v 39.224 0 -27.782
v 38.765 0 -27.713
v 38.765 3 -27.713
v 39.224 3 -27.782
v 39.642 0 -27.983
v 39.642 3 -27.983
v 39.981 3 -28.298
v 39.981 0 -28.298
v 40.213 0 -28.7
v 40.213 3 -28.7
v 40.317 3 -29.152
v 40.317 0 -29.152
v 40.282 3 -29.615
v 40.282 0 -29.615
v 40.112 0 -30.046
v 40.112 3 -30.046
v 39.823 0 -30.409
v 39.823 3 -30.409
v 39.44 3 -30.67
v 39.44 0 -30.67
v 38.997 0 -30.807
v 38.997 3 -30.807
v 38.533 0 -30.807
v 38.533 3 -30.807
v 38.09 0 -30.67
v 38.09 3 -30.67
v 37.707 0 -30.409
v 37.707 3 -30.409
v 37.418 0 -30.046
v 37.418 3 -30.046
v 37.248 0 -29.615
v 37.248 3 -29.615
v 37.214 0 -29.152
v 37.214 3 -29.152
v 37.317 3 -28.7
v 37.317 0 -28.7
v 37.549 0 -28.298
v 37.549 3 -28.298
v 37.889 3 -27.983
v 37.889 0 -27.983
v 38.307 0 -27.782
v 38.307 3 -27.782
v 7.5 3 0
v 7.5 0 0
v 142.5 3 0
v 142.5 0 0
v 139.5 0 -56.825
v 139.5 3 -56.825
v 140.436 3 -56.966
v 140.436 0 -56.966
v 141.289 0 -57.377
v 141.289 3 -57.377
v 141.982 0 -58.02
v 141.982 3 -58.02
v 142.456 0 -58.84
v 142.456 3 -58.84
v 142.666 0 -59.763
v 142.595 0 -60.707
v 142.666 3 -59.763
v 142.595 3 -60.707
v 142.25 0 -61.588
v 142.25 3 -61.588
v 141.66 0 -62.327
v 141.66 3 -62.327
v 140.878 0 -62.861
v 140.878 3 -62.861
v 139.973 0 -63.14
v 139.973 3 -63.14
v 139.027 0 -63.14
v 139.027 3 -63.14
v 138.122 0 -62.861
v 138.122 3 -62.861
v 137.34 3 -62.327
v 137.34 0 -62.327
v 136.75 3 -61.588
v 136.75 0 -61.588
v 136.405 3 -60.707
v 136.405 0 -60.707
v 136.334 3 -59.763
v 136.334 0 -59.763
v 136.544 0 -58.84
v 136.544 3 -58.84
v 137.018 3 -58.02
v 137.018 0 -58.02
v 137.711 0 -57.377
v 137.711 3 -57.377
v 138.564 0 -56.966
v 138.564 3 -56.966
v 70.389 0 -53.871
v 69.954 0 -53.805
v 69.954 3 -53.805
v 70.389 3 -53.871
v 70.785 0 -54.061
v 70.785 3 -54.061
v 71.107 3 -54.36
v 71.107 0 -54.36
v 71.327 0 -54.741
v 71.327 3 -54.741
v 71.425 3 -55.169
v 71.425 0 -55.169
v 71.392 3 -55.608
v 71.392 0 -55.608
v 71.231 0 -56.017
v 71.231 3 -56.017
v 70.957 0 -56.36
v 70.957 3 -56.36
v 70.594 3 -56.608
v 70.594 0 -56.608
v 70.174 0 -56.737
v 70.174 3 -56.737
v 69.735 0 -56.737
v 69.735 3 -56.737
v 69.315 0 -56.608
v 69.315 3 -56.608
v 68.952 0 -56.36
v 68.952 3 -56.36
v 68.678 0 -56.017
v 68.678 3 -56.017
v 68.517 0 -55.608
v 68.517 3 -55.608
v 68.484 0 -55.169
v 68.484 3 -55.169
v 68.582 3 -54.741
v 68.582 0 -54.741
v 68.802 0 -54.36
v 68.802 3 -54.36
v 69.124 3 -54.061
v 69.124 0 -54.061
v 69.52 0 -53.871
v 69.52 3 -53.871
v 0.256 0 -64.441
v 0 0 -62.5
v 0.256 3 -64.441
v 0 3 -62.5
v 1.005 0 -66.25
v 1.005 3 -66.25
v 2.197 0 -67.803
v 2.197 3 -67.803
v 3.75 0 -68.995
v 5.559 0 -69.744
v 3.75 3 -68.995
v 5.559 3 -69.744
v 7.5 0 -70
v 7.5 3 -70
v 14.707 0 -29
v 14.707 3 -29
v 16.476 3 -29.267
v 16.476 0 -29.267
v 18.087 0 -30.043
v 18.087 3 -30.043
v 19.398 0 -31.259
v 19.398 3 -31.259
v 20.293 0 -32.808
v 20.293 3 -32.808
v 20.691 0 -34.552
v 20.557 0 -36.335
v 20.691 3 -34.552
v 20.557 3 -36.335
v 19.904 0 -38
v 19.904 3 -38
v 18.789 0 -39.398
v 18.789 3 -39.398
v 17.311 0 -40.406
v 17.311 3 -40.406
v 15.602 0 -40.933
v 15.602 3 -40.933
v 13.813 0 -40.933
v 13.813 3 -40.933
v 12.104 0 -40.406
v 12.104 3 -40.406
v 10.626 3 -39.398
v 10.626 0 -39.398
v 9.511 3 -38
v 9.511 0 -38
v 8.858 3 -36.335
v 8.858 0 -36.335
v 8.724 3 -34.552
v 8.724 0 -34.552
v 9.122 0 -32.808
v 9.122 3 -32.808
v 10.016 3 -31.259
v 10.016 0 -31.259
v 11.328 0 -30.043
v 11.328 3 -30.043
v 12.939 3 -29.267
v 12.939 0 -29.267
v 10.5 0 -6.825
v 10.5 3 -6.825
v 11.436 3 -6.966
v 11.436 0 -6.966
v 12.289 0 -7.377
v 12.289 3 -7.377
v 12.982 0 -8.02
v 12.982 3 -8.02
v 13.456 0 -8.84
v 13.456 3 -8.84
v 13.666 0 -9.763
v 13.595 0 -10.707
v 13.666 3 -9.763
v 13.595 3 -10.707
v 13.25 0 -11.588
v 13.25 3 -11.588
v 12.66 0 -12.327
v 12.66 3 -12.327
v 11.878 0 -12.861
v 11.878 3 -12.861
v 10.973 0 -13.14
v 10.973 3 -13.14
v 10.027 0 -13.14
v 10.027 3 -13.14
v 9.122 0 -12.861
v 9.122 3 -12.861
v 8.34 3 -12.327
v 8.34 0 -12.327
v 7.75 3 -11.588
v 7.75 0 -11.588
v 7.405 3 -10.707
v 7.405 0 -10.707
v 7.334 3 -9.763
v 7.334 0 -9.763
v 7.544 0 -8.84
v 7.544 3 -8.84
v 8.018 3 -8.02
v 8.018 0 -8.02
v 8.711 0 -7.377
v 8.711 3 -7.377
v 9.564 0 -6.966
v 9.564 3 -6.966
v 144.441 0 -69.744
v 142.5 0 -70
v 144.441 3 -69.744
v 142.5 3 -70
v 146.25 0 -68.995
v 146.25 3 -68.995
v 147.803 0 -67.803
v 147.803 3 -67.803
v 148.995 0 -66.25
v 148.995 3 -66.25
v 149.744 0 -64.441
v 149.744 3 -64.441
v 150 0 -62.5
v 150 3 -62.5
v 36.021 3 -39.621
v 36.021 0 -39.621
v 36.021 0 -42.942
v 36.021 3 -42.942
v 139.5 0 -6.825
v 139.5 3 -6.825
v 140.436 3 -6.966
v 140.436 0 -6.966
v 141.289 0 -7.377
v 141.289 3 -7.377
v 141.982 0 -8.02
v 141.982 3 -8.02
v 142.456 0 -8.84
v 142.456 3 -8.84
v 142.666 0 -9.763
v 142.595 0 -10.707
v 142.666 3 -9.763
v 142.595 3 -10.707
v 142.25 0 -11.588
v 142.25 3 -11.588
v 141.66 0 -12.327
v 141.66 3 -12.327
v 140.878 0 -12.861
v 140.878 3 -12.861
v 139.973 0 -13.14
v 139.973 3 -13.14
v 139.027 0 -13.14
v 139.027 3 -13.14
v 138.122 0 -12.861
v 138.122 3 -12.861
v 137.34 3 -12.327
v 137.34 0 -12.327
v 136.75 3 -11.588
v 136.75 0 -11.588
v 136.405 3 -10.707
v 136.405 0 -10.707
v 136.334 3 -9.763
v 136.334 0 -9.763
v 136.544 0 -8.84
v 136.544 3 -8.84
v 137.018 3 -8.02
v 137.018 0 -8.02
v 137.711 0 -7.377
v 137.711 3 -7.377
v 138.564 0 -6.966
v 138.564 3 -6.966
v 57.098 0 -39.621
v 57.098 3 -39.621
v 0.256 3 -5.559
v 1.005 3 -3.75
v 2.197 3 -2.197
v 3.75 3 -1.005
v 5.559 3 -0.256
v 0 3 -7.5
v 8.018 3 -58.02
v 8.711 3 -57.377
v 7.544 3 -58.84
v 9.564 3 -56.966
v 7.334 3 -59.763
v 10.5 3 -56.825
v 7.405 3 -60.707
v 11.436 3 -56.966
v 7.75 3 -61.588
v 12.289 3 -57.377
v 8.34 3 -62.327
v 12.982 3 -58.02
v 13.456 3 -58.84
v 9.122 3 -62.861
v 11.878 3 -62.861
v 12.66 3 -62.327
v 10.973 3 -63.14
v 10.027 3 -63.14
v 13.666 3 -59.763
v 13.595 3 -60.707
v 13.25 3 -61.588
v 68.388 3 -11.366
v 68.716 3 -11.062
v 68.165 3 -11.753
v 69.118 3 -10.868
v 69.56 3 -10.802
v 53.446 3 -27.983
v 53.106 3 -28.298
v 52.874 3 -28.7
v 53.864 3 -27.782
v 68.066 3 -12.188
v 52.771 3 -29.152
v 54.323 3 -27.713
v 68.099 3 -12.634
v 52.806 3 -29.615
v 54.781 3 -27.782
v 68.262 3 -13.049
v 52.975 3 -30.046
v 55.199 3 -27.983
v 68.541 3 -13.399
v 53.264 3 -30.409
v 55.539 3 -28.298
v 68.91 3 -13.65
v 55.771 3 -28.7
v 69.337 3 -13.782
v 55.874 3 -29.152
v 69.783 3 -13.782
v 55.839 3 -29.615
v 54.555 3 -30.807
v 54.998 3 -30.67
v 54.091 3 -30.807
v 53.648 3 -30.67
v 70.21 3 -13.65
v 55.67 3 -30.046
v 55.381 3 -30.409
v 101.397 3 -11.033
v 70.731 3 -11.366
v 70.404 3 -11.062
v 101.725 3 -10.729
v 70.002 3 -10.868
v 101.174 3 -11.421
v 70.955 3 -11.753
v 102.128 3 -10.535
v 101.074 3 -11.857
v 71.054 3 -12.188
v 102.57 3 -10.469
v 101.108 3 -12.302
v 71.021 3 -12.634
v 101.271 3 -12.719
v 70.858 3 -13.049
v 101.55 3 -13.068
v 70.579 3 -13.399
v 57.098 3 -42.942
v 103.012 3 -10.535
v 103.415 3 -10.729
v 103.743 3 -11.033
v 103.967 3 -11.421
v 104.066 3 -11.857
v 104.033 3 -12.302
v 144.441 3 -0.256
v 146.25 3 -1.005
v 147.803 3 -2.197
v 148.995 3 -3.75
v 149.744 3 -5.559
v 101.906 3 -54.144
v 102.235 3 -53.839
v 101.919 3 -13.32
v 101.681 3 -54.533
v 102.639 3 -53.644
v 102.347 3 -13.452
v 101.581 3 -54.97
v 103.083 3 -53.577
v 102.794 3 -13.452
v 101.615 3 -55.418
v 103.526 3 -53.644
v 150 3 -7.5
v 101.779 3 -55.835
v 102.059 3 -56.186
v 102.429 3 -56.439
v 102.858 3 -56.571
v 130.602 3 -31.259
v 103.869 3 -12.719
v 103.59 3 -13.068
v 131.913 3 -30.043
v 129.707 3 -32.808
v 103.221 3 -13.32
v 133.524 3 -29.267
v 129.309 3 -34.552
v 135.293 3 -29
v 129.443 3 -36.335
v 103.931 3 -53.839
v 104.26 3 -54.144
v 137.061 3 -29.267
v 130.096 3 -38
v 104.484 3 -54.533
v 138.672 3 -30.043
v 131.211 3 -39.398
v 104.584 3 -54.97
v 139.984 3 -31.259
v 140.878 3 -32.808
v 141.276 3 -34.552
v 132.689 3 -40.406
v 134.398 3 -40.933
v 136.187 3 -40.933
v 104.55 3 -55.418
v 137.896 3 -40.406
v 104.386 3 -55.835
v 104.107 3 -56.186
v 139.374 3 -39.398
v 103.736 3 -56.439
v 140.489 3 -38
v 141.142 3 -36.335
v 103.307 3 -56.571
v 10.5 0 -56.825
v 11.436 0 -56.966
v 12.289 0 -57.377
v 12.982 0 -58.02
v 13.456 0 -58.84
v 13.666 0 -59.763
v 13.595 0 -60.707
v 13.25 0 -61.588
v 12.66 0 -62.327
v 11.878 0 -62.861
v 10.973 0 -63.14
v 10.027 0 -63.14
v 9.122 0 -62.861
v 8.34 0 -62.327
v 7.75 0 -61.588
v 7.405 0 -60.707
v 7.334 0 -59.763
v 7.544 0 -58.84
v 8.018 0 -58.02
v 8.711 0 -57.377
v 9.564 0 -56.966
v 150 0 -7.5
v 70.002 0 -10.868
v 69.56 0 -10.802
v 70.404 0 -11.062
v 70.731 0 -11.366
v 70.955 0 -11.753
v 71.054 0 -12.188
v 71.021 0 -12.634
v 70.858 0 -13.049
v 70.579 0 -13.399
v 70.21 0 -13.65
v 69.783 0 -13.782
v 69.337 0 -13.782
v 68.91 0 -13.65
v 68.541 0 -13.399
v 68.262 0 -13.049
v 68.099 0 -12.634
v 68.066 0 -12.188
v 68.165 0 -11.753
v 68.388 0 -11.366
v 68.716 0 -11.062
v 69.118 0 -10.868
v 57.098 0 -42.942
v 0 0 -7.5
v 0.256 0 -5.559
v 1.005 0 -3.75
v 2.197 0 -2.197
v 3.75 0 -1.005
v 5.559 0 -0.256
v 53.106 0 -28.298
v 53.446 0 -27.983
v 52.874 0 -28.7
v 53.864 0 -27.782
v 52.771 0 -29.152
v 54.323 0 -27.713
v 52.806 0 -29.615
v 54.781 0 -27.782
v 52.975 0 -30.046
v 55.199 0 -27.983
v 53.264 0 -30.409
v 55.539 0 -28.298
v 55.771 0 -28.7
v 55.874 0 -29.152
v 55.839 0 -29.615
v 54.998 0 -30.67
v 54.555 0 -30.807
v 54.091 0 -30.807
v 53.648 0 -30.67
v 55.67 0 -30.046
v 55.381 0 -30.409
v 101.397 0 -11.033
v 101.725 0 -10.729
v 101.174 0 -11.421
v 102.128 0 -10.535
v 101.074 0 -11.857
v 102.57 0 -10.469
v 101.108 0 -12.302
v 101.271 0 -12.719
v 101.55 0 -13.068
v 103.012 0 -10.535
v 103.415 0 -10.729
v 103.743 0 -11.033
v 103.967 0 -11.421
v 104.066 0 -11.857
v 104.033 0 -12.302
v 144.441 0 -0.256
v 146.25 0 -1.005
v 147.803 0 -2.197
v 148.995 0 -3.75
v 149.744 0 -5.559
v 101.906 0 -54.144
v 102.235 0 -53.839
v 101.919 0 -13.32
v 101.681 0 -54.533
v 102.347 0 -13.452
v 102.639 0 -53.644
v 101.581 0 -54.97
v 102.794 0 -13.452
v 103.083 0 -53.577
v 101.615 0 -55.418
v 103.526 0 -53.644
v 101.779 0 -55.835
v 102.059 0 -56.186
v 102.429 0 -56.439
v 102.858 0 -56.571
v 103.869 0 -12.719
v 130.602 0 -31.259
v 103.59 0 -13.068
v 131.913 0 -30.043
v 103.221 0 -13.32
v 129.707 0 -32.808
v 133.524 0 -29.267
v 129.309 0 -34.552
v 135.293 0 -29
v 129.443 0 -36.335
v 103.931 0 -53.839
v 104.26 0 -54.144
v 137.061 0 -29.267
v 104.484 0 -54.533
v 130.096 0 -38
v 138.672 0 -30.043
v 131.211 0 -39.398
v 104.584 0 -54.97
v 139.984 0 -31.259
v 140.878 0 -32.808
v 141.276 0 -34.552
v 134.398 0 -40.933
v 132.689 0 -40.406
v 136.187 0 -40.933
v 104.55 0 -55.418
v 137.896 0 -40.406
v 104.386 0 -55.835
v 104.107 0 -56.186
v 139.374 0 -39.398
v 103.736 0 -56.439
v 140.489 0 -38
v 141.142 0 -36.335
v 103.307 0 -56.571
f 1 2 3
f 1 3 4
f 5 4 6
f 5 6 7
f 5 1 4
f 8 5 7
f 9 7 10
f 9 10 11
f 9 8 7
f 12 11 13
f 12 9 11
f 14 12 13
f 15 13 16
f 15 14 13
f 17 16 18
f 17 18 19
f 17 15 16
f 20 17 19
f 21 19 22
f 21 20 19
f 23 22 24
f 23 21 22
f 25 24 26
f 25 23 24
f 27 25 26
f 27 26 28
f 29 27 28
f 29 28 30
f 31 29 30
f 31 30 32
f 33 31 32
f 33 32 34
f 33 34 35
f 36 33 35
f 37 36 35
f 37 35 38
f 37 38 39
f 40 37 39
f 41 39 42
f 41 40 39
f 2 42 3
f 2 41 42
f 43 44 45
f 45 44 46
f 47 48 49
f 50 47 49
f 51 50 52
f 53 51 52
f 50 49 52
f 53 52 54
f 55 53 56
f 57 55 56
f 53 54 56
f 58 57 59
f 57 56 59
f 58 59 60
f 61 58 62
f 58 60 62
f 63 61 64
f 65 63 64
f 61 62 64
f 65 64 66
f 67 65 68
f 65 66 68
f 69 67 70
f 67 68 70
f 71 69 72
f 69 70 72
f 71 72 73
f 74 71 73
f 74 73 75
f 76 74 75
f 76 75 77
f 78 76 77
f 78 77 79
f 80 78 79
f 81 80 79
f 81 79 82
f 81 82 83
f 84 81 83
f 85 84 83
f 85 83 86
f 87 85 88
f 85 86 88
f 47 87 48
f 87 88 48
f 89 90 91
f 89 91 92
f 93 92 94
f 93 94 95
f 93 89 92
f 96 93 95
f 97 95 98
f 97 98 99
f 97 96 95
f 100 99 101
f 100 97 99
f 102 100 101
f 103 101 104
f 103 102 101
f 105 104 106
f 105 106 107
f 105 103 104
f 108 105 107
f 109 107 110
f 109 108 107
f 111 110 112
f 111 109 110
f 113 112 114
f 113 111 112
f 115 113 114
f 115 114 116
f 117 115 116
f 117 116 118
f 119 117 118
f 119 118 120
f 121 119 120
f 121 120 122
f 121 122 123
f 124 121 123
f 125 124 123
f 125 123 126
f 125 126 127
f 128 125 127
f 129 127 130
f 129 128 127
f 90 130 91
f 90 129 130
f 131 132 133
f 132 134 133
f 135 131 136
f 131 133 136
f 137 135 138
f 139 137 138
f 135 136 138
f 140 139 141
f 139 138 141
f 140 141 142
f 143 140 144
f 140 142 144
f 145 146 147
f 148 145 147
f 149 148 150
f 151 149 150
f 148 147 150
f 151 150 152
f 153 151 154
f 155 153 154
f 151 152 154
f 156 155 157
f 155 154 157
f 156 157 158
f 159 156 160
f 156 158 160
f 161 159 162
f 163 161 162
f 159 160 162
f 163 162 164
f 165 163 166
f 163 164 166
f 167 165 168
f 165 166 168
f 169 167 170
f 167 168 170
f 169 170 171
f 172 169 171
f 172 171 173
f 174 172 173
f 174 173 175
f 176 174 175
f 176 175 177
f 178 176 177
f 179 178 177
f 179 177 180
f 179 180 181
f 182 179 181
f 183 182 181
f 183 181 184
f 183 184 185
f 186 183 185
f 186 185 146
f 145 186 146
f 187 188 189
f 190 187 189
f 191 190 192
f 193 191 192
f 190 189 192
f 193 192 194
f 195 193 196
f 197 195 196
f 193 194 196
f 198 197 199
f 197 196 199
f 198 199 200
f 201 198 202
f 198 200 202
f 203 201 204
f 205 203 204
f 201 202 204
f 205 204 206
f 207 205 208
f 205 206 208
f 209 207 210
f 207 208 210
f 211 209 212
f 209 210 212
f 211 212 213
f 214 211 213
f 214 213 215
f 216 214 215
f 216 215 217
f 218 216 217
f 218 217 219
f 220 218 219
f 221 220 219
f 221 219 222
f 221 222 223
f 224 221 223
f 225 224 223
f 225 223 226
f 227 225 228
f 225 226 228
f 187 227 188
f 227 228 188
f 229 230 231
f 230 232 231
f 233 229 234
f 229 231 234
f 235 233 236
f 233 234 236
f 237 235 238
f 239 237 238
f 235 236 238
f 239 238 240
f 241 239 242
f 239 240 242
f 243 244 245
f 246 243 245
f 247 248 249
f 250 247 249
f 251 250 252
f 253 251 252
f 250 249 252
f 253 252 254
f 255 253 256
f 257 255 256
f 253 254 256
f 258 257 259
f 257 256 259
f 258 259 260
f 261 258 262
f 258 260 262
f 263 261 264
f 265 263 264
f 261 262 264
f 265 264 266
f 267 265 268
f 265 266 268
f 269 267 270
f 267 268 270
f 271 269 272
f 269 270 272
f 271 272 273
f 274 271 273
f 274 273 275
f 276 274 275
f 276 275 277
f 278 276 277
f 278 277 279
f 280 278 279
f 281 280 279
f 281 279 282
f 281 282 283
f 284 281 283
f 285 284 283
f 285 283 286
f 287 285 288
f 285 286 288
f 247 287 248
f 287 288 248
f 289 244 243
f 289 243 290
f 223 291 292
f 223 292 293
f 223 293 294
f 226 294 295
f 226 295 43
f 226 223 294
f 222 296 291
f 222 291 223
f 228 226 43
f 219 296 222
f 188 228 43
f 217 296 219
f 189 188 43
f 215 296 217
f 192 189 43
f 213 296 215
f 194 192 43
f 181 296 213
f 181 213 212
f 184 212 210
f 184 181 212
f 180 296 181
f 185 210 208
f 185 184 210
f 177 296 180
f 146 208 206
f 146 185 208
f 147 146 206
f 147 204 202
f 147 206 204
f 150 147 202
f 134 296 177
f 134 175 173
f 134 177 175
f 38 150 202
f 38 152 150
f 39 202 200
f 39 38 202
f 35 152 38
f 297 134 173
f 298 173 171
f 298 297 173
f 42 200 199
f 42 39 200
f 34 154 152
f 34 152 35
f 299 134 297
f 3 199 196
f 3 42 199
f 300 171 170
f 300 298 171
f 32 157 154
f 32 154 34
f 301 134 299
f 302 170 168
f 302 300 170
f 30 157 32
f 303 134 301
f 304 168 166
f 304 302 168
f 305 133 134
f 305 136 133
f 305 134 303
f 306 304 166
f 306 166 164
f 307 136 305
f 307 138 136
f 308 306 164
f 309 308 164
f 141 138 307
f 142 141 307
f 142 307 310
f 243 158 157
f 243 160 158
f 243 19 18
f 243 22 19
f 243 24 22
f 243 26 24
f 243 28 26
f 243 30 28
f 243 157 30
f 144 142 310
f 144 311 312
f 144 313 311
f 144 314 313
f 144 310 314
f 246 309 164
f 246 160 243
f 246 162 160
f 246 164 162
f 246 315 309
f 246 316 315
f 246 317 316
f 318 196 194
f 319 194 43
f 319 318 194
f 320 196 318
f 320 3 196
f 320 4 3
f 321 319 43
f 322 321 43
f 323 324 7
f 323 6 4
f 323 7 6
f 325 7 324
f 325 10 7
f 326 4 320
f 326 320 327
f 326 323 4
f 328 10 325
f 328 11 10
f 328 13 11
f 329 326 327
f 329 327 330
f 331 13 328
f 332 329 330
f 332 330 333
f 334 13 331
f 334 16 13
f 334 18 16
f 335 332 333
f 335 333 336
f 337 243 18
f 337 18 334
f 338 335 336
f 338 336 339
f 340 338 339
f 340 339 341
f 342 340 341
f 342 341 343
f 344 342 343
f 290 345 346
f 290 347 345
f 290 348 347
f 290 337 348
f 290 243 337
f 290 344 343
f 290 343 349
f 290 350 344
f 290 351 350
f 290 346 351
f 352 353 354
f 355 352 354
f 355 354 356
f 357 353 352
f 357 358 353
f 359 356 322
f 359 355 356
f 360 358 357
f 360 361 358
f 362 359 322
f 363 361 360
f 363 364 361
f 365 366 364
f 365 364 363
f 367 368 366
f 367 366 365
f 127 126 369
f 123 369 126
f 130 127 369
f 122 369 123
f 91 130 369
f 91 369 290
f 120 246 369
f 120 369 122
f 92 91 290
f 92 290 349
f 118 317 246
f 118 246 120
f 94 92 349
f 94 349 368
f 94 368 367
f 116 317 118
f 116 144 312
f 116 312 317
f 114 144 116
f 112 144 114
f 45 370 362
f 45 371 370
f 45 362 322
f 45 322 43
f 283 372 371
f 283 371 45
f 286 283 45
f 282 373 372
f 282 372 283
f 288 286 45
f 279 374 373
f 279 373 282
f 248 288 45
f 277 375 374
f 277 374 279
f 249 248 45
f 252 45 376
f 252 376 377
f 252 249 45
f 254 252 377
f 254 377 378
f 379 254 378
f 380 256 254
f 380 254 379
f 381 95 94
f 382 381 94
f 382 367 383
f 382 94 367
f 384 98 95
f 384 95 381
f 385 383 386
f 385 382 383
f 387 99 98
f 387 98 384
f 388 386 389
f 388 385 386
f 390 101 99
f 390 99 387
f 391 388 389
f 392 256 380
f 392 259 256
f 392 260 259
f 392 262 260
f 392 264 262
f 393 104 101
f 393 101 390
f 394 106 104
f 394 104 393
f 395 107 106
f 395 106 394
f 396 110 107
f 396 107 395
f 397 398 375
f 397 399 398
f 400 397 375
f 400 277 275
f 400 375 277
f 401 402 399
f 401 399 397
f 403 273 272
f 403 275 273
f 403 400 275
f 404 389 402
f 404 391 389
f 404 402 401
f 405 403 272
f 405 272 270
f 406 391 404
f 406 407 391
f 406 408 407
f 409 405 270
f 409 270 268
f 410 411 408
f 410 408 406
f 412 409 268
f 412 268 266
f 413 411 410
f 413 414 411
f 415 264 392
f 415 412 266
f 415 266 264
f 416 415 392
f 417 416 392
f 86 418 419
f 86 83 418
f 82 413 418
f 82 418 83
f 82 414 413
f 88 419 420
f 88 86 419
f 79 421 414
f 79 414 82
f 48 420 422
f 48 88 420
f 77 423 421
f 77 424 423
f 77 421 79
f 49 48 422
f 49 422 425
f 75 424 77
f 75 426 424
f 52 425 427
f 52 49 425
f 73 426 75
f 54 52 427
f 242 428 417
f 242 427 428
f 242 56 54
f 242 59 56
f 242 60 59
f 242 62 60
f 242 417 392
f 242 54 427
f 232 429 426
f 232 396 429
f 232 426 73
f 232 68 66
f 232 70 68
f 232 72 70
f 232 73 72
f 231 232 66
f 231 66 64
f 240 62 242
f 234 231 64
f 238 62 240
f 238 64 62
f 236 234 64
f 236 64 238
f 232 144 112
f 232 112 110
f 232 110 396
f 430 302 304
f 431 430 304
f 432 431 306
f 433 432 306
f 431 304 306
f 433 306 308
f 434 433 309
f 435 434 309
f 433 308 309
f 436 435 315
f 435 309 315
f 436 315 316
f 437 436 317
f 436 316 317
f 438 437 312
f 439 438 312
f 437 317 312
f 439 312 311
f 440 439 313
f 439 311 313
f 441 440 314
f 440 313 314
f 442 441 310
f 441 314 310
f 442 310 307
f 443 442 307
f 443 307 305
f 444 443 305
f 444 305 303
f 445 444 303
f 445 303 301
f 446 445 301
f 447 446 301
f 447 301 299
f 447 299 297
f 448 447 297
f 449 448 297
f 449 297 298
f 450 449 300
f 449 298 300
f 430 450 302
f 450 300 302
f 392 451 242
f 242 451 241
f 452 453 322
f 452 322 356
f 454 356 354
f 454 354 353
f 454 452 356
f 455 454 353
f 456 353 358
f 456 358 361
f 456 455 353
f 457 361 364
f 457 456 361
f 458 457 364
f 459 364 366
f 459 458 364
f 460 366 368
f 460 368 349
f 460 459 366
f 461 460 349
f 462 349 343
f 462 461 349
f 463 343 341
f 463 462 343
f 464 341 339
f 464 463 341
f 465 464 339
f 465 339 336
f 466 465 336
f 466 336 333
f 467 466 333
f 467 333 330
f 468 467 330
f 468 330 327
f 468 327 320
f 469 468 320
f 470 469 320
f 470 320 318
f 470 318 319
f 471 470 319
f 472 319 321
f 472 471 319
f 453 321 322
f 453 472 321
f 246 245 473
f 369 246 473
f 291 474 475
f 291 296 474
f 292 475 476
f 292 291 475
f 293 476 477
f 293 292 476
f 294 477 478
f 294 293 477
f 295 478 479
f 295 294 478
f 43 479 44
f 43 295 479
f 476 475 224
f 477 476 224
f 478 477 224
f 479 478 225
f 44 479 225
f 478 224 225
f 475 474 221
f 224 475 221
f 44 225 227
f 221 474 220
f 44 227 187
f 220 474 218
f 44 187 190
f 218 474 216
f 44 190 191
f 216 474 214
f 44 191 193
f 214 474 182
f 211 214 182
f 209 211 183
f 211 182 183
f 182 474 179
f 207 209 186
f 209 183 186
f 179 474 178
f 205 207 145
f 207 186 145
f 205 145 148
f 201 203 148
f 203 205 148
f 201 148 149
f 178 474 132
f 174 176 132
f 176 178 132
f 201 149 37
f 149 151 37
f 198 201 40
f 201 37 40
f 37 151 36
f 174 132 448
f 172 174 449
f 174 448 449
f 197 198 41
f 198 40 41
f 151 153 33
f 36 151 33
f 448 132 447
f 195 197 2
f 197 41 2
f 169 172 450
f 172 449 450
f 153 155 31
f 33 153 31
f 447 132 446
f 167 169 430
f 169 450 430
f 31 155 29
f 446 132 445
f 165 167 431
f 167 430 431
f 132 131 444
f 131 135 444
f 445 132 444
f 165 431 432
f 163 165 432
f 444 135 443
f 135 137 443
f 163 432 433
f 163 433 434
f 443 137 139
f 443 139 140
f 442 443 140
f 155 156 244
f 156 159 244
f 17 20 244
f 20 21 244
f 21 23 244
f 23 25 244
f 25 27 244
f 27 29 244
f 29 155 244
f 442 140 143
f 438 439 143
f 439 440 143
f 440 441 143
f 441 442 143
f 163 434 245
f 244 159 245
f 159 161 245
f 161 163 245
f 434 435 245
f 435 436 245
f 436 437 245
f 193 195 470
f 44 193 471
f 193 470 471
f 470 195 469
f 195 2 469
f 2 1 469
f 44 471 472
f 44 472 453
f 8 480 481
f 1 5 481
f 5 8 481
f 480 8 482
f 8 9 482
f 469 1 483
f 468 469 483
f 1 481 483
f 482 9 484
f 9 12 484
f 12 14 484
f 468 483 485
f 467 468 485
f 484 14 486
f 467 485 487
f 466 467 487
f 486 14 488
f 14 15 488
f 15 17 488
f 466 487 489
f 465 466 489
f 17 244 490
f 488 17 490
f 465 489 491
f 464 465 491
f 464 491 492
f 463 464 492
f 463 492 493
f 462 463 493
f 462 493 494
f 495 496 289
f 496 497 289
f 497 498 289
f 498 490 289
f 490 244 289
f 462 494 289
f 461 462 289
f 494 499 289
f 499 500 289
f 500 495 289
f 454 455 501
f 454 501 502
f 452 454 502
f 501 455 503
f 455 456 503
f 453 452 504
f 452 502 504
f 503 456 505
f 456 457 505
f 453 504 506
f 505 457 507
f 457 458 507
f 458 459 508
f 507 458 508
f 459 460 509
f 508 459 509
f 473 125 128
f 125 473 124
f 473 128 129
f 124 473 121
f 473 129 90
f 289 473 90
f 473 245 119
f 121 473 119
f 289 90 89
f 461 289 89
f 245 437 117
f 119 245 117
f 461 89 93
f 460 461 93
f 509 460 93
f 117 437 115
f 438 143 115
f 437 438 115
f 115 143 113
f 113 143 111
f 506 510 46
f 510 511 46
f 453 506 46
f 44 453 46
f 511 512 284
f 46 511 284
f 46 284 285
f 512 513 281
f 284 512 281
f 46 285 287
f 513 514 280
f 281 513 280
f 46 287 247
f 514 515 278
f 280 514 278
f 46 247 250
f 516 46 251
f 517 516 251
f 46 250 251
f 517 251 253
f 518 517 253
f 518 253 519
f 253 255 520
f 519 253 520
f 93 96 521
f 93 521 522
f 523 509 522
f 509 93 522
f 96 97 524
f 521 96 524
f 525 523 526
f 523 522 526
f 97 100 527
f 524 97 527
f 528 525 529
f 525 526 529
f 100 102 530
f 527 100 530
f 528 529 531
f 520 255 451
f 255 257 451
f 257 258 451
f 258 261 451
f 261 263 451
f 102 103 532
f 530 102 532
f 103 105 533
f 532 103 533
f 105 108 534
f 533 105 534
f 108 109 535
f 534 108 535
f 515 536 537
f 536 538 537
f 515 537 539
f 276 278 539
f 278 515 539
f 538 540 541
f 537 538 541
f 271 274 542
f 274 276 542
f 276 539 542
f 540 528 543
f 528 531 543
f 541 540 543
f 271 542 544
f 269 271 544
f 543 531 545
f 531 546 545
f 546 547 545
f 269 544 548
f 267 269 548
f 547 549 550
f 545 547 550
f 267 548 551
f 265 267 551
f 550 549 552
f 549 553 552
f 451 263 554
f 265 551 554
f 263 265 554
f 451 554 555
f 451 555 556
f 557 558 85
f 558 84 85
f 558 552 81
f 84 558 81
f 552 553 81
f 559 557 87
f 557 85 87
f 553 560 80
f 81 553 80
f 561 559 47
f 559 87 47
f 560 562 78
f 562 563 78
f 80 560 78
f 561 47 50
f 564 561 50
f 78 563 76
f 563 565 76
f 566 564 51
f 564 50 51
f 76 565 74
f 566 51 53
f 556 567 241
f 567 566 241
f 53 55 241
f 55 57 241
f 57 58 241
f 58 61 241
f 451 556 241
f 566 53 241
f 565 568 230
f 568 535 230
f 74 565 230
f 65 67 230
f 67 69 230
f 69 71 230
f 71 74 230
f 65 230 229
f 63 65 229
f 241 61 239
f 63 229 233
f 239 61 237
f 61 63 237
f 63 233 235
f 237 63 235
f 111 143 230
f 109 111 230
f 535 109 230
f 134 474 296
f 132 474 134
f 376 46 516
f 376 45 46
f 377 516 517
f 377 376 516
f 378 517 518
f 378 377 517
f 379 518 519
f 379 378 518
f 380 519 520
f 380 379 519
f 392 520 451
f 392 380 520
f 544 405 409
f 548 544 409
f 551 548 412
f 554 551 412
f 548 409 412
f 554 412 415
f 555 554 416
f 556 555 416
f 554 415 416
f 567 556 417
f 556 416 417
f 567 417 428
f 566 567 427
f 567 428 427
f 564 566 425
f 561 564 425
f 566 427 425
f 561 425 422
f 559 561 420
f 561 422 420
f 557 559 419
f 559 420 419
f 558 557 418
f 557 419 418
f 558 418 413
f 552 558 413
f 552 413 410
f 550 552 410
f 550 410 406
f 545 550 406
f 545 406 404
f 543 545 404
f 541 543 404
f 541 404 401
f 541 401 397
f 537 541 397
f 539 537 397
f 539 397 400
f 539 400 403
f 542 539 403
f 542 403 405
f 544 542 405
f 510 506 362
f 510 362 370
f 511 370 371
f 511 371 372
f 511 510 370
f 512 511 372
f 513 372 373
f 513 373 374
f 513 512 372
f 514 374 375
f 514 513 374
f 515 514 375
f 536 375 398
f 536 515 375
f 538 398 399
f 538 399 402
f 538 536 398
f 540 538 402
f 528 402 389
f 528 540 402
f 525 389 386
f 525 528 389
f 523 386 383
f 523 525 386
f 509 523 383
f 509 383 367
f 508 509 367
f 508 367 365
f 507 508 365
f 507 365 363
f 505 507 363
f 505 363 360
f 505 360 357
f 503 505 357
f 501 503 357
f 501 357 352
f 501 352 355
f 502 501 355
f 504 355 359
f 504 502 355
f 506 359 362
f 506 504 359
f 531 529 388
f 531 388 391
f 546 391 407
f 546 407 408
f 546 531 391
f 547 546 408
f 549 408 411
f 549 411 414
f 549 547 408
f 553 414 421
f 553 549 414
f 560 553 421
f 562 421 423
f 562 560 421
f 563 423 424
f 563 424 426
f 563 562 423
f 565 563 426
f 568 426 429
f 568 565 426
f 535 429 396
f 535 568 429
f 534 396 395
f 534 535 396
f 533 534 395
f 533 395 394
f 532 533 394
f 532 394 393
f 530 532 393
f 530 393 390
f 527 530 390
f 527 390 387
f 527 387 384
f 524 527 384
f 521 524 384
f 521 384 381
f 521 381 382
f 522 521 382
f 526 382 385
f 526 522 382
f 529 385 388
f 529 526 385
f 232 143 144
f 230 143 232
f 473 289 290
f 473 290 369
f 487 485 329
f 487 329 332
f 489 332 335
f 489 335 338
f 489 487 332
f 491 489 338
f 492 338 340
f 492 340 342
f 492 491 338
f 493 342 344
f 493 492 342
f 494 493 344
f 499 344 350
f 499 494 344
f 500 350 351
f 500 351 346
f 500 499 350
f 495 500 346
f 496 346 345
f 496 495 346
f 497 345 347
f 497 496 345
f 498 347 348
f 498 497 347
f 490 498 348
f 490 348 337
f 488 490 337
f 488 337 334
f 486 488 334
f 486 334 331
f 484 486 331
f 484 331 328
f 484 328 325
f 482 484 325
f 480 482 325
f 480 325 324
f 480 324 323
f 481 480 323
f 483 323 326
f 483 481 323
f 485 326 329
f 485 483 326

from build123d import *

# Parameters (mm, degrees)
ESBO_O2_W                = 150
ESBO_O2_H                = 70
ESBO_O2_R                = 1.505424276
ESBO_O2_R_2              = 1.49848088
ESBO_O2_R_3              = 1.474413832
ESBO_O2_R_4              = 1.5
ESBO_O2_R_5              = 1.55575
ESBO_O2_W_2              = 21.076348962
ESBO_O2_H_2              = 3.321026243
RESSALTO_EXTRUS_O1_DEPTH = 3
ESBO_O4_R                = 3.175
CORTE_EXTRUS_O1_DEPTH    = 3
FILETE1_R                = 7.5
ESBO_O8_R                = 6
CORTE_EXTRUS_O3_DEPTH    = 10


with BuildPart() as part:
    # Esboço2 → Ressalto-extrusão1 (new body)
    with BuildSketch(Plane(origin=(0, 0, 0), x_dir=(1, 0, 0), z_dir=(0, 1, 0))):
        with Locations((75, 35)):
            Rectangle(ESBO_O2_W, ESBO_O2_H)
        with Locations(Location((103.082572265, 55.082550604, 0), (0, 0, 270))):
            Circle(ESBO_O2_R, mode=Mode.SUBTRACT)
        with Locations(Location((69.55992433, 12.300225249, 0), (0, 0, 270))):
            Circle(ESBO_O2_R_2, mode=Mode.SUBTRACT)
        with Locations(Location((69.954401909, 55.279412058, 0), (0, 0, 270))):
            Circle(ESBO_O2_R_3, mode=Mode.SUBTRACT)
        with Locations(Location((102.570189974, 11.968678193, 0), (0, 0, 270))):
            Circle(ESBO_O2_R_4, mode=Mode.SUBTRACT)
        with Locations(Location((38.765135158, 29.268361159, 0), (0, 0, 270))):
            Circle(ESBO_O2_R_5, mode=Mode.SUBTRACT)
        with Locations(Location((54.322635158, 29.268361159, 0), (0, 0, 270))):
            Circle(ESBO_O2_R_5, mode=Mode.SUBTRACT)
        with Locations((46.559410677, 41.281799613)):
            Rectangle(ESBO_O2_W_2, ESBO_O2_H_2, mode=Mode.SUBTRACT)
    extrude(amount=RESSALTO_EXTRUS_O1_DEPTH)

    # Esboço4 → Corte-extrusão1 (cut)
    with BuildSketch(Plane(origin=(0, 3, 0), x_dir=(1, 0, 0), z_dir=(0, 1, 0))):
        with Locations(Location((10.5, 60, 0), (0, 0, 270))):
            Circle(ESBO_O4_R)
        with Locations(Location((139.5, 60, 0), (0, 0, 270))):
            Circle(ESBO_O4_R)
        with Locations(Location((139.5, 10, 0), (0, 0, 270))):
            Circle(ESBO_O4_R)
        with Locations(Location((10.5, 10, 0), (0, 0, 270))):
            Circle(ESBO_O4_R)
    extrude(amount=-CORTE_EXTRUS_O1_DEPTH, mode=Mode.SUBTRACT)

    # Filete1
    filete1_edges = [part.edges().sort_by_distance(p)[0] for p in [
        (0, 1.5, -70),
        (150, 1.5, -70),
        (150, 1.5, 0),
        (0, 1.5, 0),
    ]]
    fillet(filete1_edges, radius=FILETE1_R)

    # Esboço8 → Corte-extrusão3 (cut)
    with BuildSketch(Plane(origin=(0, 3, 0), x_dir=(1, 0, 0), z_dir=(0, 1, 0))):
        with Locations(Location((14.707477015, 35, 0), (0, 0, 270))):
            Circle(ESBO_O8_R)
        with Locations(Location((135.29252298, 35, 0), (0, 0, 270))):
            Circle(ESBO_O8_R)
    extrude(amount=-CORTE_EXTRUS_O3_DEPTH, mode=Mode.SUBTRACT)


solid = part.part
